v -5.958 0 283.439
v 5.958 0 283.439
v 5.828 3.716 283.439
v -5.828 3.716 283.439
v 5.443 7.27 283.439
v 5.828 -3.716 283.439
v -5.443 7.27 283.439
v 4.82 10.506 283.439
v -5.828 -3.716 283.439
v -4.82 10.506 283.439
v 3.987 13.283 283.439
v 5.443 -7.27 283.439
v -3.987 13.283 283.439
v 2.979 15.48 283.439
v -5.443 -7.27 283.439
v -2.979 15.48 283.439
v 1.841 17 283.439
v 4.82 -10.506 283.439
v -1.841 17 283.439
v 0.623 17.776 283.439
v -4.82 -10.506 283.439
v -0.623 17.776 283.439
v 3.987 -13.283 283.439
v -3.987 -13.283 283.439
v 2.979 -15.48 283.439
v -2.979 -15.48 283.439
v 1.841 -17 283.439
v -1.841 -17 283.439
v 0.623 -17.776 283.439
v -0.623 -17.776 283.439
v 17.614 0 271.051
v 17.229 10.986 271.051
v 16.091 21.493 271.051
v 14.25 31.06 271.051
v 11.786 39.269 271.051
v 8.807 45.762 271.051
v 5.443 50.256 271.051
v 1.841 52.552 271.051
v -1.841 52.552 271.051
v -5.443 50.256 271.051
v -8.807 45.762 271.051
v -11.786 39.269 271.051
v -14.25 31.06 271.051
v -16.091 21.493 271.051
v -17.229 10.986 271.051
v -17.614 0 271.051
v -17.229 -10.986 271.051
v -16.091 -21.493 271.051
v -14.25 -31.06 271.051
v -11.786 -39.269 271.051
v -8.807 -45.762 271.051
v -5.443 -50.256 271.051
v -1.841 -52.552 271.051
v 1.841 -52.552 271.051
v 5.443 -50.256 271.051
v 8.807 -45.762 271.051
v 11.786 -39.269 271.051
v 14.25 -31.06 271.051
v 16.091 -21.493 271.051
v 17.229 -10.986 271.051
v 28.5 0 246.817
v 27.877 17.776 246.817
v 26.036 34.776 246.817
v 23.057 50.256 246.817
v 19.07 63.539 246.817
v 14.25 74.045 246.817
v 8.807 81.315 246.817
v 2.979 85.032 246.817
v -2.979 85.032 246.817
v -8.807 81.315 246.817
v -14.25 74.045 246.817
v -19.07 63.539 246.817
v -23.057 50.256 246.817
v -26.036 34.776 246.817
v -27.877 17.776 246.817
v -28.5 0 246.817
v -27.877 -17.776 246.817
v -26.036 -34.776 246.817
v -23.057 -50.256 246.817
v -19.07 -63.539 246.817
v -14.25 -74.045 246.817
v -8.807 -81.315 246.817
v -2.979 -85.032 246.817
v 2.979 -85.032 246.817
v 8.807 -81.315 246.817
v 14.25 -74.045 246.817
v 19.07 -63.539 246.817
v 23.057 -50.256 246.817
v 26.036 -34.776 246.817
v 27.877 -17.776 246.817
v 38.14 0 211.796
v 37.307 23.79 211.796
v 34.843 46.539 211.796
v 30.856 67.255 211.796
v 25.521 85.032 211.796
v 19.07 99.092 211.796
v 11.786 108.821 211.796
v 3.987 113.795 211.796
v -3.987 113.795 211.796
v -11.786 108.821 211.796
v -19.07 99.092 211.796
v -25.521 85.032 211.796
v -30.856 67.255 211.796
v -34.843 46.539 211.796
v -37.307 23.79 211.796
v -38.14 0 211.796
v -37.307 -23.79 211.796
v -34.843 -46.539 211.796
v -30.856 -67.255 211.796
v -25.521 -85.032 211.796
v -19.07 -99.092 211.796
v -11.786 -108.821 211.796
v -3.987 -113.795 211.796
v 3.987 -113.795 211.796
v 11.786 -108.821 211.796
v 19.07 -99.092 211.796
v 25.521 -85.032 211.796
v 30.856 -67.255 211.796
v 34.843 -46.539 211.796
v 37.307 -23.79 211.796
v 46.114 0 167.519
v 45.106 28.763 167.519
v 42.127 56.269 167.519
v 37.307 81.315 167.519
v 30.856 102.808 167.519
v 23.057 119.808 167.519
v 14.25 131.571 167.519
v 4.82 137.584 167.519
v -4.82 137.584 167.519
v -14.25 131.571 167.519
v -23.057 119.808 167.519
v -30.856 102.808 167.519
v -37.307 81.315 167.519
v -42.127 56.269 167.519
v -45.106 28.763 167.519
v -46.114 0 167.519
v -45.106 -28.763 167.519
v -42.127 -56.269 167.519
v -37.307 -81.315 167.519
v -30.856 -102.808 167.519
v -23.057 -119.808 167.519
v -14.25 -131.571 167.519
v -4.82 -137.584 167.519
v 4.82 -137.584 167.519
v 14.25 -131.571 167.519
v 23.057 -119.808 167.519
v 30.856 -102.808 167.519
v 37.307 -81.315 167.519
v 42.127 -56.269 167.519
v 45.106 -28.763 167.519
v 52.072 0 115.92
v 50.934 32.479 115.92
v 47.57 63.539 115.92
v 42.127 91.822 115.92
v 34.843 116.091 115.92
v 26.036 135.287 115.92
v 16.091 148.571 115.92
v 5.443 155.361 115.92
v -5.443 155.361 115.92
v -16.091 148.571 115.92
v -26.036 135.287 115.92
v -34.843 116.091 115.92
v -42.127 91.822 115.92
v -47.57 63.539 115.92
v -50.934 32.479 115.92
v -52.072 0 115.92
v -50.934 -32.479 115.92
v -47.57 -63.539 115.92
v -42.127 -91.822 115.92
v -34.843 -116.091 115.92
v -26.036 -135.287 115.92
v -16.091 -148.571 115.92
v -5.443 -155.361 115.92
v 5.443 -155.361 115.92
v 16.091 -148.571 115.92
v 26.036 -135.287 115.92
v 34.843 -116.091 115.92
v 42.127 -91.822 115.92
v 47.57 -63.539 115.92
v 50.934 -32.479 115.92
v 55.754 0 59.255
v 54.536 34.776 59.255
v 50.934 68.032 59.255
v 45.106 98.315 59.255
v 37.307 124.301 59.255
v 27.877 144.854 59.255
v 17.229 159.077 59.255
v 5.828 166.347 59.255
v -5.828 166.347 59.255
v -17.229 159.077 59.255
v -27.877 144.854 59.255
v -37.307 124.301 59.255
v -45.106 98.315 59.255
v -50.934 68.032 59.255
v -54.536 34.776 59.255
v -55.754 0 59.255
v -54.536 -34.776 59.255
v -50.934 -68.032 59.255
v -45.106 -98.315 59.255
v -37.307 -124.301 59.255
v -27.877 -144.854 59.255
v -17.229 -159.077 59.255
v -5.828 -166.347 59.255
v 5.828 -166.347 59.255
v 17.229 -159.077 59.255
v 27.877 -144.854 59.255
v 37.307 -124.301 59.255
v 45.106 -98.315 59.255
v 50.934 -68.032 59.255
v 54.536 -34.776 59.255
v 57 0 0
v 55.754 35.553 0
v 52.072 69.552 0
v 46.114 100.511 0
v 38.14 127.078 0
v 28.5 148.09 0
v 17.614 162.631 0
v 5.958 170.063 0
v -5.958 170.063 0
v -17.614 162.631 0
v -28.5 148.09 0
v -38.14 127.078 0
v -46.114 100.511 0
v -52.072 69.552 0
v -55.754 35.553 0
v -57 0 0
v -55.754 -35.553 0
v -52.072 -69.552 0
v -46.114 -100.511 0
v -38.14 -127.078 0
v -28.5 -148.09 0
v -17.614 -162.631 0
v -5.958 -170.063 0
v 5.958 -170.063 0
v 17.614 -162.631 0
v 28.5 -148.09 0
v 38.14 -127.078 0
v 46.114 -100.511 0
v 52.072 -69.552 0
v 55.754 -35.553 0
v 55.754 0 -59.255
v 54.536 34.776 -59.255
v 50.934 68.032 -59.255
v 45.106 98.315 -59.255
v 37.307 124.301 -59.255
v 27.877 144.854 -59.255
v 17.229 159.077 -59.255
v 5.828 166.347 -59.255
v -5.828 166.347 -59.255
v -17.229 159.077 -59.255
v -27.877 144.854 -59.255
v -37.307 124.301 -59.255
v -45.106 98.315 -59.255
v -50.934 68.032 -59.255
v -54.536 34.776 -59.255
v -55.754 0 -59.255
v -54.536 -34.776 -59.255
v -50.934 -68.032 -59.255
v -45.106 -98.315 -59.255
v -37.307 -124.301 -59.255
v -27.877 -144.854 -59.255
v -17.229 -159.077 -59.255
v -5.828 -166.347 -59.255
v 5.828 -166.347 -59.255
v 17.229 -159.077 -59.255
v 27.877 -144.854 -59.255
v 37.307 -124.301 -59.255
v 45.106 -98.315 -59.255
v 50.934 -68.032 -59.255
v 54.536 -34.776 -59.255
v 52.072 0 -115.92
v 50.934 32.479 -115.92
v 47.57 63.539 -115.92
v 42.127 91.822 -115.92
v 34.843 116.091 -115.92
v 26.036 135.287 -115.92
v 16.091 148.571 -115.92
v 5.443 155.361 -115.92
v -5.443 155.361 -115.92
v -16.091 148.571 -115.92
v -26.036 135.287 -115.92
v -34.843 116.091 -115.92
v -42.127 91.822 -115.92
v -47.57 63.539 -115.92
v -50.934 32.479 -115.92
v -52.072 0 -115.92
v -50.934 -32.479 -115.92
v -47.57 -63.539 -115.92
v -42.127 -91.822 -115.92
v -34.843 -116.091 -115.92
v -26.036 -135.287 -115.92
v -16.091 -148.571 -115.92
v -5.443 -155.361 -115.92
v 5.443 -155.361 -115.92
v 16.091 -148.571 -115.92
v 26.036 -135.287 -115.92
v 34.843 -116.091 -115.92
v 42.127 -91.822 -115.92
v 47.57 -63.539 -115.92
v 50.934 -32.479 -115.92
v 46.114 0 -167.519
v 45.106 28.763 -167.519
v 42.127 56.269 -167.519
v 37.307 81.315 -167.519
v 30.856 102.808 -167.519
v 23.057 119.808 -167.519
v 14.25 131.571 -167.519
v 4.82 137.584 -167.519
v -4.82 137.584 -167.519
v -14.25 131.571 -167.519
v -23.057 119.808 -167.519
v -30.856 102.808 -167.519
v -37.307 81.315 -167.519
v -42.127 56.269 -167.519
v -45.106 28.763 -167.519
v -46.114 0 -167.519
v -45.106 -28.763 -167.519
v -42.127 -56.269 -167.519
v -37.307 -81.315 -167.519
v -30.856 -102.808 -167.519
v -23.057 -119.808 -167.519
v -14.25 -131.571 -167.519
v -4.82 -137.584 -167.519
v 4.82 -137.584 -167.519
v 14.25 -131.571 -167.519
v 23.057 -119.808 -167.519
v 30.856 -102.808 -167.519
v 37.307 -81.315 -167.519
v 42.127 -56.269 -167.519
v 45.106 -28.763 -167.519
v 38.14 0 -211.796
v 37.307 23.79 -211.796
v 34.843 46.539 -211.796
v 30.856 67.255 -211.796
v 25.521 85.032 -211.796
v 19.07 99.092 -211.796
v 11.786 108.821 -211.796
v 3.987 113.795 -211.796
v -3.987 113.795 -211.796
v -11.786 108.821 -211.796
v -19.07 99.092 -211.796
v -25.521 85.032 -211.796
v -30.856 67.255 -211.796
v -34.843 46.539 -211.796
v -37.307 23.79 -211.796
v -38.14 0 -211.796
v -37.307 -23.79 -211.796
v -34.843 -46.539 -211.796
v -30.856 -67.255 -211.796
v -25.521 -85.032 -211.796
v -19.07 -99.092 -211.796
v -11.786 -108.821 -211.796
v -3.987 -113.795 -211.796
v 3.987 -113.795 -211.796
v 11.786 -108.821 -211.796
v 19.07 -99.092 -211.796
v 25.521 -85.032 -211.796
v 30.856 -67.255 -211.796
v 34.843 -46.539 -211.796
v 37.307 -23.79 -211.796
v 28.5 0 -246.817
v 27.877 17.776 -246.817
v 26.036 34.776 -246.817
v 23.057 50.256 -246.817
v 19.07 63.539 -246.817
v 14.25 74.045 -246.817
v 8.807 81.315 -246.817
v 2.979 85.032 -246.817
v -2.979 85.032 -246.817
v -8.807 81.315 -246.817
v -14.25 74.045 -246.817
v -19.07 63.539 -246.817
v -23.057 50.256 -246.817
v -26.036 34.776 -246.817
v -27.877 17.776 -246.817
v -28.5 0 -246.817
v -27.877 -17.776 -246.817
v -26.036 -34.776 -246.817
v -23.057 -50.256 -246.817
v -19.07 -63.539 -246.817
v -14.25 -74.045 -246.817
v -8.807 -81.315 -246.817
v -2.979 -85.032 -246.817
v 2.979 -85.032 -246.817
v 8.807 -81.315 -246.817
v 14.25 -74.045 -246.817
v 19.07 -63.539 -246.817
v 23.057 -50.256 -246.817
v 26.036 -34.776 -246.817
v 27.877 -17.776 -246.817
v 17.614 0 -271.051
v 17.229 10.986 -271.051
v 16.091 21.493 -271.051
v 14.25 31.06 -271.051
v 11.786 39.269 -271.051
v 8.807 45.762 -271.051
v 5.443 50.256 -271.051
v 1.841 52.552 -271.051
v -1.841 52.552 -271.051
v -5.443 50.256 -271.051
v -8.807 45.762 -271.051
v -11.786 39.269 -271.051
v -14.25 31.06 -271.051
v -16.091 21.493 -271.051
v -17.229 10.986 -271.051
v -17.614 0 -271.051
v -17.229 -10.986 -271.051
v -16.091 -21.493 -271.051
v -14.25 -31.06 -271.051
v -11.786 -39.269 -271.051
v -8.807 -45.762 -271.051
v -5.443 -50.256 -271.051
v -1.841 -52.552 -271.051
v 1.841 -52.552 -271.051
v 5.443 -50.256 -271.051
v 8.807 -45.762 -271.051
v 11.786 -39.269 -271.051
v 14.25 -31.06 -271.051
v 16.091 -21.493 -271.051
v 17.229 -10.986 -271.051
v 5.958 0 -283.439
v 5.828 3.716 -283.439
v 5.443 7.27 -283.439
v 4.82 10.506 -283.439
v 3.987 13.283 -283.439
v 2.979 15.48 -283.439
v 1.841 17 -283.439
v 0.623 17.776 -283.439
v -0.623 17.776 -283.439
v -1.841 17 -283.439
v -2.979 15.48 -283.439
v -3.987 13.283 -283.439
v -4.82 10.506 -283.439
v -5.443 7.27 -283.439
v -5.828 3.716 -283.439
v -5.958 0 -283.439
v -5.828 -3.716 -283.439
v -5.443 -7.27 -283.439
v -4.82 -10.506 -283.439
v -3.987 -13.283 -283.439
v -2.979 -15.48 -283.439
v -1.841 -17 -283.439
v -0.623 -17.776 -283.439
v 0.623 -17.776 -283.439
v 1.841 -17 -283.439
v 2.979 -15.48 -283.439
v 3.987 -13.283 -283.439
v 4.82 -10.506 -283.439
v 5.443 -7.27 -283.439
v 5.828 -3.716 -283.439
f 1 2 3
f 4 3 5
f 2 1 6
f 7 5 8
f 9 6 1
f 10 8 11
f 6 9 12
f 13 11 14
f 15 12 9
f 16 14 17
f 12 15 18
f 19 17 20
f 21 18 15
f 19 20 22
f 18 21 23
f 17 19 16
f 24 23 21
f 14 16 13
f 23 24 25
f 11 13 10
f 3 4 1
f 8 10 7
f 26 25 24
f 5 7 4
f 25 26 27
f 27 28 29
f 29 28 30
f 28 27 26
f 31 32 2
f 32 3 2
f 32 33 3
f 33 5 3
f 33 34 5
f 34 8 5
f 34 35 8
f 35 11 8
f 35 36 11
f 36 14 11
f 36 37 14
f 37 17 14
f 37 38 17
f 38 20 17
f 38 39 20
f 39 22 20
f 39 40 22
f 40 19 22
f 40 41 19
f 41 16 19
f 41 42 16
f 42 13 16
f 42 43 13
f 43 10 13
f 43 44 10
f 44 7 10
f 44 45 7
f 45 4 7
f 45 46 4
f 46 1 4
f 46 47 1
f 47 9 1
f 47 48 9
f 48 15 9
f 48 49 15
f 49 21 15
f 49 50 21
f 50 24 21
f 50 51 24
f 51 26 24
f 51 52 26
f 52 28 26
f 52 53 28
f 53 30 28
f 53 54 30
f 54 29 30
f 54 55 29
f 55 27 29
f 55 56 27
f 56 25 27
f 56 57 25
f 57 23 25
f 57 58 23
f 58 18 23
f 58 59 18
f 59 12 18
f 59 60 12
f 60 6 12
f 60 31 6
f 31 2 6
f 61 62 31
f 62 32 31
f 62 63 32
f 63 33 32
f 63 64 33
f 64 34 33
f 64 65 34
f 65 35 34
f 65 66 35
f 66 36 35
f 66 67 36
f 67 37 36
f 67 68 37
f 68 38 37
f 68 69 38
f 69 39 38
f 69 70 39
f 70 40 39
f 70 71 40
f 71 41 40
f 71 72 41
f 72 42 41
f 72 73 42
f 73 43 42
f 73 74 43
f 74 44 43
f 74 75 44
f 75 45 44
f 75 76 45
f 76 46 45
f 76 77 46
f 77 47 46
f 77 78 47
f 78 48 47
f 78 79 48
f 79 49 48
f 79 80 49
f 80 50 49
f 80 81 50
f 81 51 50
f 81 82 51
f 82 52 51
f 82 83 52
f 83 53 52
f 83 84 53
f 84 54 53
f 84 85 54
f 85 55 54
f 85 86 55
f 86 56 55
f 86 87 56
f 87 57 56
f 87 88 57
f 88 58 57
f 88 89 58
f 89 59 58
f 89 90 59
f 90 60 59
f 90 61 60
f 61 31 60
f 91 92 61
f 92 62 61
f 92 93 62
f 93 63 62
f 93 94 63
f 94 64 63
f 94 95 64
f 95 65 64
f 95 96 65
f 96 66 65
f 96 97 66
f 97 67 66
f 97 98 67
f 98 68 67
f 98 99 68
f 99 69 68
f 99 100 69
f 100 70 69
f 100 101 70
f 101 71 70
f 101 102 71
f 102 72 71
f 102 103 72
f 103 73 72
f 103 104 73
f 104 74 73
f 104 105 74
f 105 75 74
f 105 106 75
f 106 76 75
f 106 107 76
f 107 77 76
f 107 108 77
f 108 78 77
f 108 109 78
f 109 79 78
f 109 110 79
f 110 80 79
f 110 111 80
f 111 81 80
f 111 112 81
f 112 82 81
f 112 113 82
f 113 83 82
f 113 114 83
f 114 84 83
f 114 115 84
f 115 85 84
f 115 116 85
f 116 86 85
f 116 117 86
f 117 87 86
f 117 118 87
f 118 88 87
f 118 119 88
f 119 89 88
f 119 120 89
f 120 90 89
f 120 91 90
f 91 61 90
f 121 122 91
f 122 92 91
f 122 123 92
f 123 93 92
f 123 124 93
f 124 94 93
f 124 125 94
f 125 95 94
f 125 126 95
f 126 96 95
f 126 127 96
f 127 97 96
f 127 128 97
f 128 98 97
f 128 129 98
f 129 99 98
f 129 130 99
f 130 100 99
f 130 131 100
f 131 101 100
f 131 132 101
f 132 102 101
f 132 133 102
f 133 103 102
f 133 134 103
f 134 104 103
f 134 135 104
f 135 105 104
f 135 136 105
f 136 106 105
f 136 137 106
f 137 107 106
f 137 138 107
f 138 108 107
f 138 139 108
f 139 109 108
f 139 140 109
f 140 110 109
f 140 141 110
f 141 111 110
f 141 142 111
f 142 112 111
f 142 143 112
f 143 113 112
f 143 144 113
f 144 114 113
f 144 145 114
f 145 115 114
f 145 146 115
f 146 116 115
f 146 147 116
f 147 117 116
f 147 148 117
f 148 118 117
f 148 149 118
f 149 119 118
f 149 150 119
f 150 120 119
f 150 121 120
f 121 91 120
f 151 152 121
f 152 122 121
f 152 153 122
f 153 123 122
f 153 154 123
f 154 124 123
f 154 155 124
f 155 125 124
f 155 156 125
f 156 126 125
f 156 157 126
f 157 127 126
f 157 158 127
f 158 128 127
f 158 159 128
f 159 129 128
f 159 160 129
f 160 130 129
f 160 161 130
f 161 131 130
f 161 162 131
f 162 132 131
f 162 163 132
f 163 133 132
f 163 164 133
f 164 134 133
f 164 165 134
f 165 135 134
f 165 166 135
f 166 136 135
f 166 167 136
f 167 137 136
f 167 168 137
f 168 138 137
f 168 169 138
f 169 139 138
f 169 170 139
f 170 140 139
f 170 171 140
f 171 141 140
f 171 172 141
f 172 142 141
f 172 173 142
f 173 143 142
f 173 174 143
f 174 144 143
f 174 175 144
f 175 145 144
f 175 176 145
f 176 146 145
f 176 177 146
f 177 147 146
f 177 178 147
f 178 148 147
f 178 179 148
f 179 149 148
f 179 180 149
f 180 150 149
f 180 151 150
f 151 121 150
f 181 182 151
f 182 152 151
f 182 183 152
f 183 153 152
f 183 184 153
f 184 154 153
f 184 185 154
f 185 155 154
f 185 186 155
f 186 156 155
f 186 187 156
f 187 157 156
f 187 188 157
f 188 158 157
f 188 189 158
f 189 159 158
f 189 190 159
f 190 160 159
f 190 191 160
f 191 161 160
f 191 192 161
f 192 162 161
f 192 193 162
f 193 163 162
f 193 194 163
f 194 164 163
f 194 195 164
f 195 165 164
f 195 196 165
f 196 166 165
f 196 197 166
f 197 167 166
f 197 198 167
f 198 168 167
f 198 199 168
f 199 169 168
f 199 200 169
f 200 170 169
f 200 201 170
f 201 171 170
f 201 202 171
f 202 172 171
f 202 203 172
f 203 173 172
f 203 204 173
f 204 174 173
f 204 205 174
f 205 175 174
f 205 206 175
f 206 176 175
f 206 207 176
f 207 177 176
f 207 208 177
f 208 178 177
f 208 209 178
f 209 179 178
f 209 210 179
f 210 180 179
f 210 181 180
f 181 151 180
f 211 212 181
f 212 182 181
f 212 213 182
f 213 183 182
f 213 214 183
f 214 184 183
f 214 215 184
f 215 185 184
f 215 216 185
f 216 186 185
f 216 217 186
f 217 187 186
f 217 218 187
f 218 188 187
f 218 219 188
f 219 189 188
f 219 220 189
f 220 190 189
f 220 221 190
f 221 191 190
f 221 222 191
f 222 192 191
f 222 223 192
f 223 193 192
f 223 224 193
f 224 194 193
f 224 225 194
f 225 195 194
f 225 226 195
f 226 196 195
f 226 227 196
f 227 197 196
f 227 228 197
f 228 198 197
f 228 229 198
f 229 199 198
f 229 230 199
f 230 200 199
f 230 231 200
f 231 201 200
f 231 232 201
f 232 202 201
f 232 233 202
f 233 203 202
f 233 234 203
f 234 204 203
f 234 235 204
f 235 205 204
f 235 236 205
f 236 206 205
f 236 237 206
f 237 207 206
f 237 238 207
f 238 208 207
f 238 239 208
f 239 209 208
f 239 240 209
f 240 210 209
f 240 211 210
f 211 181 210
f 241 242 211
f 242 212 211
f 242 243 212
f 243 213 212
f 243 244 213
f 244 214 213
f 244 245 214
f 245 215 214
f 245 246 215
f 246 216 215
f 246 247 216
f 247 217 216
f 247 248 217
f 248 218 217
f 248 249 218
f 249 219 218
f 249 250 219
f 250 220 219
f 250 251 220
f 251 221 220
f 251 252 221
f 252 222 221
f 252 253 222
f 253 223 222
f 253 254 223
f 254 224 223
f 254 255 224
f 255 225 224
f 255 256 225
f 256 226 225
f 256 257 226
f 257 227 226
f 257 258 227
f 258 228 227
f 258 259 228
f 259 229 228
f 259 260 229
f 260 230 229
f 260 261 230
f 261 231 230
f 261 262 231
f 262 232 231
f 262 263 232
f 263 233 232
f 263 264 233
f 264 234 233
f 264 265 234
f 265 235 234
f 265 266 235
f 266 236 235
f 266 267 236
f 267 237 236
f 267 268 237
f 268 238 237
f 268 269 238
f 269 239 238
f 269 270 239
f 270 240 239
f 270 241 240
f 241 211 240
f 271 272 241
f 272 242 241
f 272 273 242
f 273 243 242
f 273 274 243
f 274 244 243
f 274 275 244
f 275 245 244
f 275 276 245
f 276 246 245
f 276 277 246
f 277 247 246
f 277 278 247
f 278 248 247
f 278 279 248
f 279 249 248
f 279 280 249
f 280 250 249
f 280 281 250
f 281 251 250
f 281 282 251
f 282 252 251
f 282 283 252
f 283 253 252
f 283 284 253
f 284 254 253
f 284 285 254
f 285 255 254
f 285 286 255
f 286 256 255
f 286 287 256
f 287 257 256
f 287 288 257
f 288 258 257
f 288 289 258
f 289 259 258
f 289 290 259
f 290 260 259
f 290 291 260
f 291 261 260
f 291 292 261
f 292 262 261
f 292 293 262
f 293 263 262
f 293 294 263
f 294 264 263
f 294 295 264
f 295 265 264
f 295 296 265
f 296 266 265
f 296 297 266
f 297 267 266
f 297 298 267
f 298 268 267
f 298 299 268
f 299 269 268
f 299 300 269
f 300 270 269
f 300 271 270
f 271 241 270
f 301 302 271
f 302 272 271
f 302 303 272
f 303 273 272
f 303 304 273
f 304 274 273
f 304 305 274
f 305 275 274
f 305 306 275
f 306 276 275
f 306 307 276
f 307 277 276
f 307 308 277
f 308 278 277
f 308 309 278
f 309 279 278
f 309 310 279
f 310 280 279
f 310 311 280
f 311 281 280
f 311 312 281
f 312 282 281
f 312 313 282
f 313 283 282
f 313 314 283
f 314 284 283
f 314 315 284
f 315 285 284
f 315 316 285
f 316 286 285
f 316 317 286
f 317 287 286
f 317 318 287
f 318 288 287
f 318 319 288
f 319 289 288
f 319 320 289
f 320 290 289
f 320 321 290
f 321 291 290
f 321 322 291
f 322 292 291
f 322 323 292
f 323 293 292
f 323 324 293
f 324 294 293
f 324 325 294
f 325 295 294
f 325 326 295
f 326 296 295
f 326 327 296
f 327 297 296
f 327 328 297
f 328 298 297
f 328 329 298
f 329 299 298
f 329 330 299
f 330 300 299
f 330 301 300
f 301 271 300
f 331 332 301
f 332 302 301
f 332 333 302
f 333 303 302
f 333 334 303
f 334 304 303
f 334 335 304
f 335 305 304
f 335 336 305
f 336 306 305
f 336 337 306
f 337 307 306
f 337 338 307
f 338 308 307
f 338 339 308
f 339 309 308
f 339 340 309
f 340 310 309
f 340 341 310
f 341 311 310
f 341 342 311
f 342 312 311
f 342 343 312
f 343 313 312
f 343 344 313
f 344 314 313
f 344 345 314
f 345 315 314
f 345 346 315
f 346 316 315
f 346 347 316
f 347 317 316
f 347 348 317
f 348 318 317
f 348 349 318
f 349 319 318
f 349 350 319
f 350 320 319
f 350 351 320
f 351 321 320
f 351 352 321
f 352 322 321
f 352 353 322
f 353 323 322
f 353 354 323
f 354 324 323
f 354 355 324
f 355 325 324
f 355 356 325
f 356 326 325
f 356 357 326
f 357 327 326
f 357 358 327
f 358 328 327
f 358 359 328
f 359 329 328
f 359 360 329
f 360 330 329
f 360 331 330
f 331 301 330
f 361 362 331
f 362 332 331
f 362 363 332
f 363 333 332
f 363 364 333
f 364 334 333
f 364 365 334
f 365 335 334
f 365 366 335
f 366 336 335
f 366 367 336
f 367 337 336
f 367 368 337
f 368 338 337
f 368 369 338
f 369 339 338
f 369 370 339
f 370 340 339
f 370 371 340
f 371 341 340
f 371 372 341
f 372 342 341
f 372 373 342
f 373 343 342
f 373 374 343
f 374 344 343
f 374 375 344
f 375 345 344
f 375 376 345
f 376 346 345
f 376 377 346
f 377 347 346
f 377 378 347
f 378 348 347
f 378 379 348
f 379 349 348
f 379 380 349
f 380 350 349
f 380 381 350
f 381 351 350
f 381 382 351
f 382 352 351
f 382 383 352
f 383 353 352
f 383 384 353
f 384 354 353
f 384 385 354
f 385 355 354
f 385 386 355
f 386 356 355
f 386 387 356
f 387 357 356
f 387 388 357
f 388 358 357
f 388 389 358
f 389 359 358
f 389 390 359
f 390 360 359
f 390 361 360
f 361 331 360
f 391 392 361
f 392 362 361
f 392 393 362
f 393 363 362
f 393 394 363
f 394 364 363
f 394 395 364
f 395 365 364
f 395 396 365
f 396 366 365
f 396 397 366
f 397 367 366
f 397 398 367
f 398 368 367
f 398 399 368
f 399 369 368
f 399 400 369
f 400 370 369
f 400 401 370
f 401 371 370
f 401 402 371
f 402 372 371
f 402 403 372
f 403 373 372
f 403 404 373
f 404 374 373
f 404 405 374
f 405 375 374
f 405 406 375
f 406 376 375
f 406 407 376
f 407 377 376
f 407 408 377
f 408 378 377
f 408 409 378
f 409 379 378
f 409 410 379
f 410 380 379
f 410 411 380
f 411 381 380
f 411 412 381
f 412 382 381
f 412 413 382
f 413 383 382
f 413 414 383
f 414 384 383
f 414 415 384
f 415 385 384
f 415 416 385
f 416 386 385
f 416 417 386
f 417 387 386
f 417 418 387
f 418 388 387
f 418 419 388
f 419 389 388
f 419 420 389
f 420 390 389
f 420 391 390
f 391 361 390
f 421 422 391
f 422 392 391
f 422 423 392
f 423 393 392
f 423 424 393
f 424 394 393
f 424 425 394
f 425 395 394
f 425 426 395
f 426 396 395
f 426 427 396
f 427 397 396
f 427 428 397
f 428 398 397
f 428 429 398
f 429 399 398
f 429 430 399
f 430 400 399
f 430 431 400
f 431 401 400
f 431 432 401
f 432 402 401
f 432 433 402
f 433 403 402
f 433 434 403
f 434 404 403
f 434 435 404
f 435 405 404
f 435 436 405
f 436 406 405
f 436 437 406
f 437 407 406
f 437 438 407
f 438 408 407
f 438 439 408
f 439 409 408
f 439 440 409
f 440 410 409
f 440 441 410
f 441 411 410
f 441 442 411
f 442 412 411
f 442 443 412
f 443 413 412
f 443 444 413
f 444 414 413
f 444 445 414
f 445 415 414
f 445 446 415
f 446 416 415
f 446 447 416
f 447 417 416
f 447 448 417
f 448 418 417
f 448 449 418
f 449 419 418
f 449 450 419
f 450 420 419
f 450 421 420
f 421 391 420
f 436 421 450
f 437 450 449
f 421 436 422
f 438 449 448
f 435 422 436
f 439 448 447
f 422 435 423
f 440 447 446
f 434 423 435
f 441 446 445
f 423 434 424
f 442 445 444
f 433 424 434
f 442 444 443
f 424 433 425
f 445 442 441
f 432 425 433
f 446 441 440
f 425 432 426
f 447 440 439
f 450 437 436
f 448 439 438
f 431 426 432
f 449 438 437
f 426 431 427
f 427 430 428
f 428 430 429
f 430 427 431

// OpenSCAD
// Generated by SolidPython 1.0.1 on 2020-07-29 00:46:45


scale(v = [3, 9, 15]) {
	sphere(r = 19);
}
/***********************************************
*********      SolidPython code:      **********
************************************************
 
# import packages: SolidPython
from solid import *
from solid.utils import *
from itertools import chain, combinations, permutations


class Resize:

    def __init__(self, scad_file):
        self.scad_file = scad_file
        #self.scad_file = import_scad(scad_file)
        # cone/cylinder param:
        self.r1 = 0
        self.r2 = 0
        self.h = 0
        # rectangular prism param:
        self.w = 0
        self.l = 0
        # ellipse param:
        self.r = 0

    # import OpenScad code (file name corresponds to shape)


    # classify shape + parameters
    def assign(self, param1, param2, param3):
        if self.scad_file == 'cone.scad':
            self.r1 = param1
            self.r2 = param2
            self.h = param3
        elif self.scad_file == 'cylinder.scad':
            self.r1 = param1
            self.r2 = param2
            self.h = param3
        elif self.scad_file == 'rectangularPrism.scad':
            self.h = param1
            self.l = param2
            self.w = param3
        else:
            self.r = param1
            self.h = param2

    # resize parameters
    def iterate(self):
        x = range(3, 20, 2)
        i = 1
        if self.scad_file == 'cone.scad':
            tempList = list(permutations(x, 2))
            for temp in tempList:
                param1 = temp[0]
                param2 = temp[1]
                filepath = 'produced_scad_files/' + 'cone' + str(param1) + '_' + str(param2) + '_' + '.scad'
                scad_render_to_file(cylinder(h=param1, r1=param2, r2=0), filepath)

        elif self.scad_file == 'cylinder.scad':
            tempList = list(permutations(x, 3))
            for temp in tempList:
                param1 = temp[0]
                param2 = temp[1]
                filepath = 'produced_scad_files/' + 'cylinder' + str(param1) + '_' + str(param2) + '_' + '.scad'
                scad_render_to_file(cylinder(h=param1, r1=param2, r2=param2), filepath)

        elif self.scad_file == 'rectangularPrism.scad':
            tempList = list(permutations(x, 3))
            for temp in tempList:
                param1 = temp[0]
                param2 = temp[1]
                param3 = temp[2]
                filepath = 'produced_scad_files/' + 'rectangularPrism' + str(param1) + '_' + str(param2) + '_' + str(
                    param3) + '.scad'
                scad_render_to_file(cube(size=(param1, param2, param3)), filepath)

        elif self.scad_file == 'ellipse.scad':
            tempList = list(permutations(x, 4))
            for temp in tempList:
                param1 = temp[0]
                param2 = temp[1]
                param3 = temp[2]
                param4 = temp[3]
                filepath = 'produced_scad_files/' + 'ellipse' + str(param1) + '_' + str(param2) + '_' + str(param3) + '_' + str(param4) + '.scad'
                scad_render_to_file(scale([param1, param2, param3])(sphere(r=param4)), filepath)

    def render_to_scadfile(self):
        scad_render_to_file(scad, 'example.scad') 
 
************************************************/
